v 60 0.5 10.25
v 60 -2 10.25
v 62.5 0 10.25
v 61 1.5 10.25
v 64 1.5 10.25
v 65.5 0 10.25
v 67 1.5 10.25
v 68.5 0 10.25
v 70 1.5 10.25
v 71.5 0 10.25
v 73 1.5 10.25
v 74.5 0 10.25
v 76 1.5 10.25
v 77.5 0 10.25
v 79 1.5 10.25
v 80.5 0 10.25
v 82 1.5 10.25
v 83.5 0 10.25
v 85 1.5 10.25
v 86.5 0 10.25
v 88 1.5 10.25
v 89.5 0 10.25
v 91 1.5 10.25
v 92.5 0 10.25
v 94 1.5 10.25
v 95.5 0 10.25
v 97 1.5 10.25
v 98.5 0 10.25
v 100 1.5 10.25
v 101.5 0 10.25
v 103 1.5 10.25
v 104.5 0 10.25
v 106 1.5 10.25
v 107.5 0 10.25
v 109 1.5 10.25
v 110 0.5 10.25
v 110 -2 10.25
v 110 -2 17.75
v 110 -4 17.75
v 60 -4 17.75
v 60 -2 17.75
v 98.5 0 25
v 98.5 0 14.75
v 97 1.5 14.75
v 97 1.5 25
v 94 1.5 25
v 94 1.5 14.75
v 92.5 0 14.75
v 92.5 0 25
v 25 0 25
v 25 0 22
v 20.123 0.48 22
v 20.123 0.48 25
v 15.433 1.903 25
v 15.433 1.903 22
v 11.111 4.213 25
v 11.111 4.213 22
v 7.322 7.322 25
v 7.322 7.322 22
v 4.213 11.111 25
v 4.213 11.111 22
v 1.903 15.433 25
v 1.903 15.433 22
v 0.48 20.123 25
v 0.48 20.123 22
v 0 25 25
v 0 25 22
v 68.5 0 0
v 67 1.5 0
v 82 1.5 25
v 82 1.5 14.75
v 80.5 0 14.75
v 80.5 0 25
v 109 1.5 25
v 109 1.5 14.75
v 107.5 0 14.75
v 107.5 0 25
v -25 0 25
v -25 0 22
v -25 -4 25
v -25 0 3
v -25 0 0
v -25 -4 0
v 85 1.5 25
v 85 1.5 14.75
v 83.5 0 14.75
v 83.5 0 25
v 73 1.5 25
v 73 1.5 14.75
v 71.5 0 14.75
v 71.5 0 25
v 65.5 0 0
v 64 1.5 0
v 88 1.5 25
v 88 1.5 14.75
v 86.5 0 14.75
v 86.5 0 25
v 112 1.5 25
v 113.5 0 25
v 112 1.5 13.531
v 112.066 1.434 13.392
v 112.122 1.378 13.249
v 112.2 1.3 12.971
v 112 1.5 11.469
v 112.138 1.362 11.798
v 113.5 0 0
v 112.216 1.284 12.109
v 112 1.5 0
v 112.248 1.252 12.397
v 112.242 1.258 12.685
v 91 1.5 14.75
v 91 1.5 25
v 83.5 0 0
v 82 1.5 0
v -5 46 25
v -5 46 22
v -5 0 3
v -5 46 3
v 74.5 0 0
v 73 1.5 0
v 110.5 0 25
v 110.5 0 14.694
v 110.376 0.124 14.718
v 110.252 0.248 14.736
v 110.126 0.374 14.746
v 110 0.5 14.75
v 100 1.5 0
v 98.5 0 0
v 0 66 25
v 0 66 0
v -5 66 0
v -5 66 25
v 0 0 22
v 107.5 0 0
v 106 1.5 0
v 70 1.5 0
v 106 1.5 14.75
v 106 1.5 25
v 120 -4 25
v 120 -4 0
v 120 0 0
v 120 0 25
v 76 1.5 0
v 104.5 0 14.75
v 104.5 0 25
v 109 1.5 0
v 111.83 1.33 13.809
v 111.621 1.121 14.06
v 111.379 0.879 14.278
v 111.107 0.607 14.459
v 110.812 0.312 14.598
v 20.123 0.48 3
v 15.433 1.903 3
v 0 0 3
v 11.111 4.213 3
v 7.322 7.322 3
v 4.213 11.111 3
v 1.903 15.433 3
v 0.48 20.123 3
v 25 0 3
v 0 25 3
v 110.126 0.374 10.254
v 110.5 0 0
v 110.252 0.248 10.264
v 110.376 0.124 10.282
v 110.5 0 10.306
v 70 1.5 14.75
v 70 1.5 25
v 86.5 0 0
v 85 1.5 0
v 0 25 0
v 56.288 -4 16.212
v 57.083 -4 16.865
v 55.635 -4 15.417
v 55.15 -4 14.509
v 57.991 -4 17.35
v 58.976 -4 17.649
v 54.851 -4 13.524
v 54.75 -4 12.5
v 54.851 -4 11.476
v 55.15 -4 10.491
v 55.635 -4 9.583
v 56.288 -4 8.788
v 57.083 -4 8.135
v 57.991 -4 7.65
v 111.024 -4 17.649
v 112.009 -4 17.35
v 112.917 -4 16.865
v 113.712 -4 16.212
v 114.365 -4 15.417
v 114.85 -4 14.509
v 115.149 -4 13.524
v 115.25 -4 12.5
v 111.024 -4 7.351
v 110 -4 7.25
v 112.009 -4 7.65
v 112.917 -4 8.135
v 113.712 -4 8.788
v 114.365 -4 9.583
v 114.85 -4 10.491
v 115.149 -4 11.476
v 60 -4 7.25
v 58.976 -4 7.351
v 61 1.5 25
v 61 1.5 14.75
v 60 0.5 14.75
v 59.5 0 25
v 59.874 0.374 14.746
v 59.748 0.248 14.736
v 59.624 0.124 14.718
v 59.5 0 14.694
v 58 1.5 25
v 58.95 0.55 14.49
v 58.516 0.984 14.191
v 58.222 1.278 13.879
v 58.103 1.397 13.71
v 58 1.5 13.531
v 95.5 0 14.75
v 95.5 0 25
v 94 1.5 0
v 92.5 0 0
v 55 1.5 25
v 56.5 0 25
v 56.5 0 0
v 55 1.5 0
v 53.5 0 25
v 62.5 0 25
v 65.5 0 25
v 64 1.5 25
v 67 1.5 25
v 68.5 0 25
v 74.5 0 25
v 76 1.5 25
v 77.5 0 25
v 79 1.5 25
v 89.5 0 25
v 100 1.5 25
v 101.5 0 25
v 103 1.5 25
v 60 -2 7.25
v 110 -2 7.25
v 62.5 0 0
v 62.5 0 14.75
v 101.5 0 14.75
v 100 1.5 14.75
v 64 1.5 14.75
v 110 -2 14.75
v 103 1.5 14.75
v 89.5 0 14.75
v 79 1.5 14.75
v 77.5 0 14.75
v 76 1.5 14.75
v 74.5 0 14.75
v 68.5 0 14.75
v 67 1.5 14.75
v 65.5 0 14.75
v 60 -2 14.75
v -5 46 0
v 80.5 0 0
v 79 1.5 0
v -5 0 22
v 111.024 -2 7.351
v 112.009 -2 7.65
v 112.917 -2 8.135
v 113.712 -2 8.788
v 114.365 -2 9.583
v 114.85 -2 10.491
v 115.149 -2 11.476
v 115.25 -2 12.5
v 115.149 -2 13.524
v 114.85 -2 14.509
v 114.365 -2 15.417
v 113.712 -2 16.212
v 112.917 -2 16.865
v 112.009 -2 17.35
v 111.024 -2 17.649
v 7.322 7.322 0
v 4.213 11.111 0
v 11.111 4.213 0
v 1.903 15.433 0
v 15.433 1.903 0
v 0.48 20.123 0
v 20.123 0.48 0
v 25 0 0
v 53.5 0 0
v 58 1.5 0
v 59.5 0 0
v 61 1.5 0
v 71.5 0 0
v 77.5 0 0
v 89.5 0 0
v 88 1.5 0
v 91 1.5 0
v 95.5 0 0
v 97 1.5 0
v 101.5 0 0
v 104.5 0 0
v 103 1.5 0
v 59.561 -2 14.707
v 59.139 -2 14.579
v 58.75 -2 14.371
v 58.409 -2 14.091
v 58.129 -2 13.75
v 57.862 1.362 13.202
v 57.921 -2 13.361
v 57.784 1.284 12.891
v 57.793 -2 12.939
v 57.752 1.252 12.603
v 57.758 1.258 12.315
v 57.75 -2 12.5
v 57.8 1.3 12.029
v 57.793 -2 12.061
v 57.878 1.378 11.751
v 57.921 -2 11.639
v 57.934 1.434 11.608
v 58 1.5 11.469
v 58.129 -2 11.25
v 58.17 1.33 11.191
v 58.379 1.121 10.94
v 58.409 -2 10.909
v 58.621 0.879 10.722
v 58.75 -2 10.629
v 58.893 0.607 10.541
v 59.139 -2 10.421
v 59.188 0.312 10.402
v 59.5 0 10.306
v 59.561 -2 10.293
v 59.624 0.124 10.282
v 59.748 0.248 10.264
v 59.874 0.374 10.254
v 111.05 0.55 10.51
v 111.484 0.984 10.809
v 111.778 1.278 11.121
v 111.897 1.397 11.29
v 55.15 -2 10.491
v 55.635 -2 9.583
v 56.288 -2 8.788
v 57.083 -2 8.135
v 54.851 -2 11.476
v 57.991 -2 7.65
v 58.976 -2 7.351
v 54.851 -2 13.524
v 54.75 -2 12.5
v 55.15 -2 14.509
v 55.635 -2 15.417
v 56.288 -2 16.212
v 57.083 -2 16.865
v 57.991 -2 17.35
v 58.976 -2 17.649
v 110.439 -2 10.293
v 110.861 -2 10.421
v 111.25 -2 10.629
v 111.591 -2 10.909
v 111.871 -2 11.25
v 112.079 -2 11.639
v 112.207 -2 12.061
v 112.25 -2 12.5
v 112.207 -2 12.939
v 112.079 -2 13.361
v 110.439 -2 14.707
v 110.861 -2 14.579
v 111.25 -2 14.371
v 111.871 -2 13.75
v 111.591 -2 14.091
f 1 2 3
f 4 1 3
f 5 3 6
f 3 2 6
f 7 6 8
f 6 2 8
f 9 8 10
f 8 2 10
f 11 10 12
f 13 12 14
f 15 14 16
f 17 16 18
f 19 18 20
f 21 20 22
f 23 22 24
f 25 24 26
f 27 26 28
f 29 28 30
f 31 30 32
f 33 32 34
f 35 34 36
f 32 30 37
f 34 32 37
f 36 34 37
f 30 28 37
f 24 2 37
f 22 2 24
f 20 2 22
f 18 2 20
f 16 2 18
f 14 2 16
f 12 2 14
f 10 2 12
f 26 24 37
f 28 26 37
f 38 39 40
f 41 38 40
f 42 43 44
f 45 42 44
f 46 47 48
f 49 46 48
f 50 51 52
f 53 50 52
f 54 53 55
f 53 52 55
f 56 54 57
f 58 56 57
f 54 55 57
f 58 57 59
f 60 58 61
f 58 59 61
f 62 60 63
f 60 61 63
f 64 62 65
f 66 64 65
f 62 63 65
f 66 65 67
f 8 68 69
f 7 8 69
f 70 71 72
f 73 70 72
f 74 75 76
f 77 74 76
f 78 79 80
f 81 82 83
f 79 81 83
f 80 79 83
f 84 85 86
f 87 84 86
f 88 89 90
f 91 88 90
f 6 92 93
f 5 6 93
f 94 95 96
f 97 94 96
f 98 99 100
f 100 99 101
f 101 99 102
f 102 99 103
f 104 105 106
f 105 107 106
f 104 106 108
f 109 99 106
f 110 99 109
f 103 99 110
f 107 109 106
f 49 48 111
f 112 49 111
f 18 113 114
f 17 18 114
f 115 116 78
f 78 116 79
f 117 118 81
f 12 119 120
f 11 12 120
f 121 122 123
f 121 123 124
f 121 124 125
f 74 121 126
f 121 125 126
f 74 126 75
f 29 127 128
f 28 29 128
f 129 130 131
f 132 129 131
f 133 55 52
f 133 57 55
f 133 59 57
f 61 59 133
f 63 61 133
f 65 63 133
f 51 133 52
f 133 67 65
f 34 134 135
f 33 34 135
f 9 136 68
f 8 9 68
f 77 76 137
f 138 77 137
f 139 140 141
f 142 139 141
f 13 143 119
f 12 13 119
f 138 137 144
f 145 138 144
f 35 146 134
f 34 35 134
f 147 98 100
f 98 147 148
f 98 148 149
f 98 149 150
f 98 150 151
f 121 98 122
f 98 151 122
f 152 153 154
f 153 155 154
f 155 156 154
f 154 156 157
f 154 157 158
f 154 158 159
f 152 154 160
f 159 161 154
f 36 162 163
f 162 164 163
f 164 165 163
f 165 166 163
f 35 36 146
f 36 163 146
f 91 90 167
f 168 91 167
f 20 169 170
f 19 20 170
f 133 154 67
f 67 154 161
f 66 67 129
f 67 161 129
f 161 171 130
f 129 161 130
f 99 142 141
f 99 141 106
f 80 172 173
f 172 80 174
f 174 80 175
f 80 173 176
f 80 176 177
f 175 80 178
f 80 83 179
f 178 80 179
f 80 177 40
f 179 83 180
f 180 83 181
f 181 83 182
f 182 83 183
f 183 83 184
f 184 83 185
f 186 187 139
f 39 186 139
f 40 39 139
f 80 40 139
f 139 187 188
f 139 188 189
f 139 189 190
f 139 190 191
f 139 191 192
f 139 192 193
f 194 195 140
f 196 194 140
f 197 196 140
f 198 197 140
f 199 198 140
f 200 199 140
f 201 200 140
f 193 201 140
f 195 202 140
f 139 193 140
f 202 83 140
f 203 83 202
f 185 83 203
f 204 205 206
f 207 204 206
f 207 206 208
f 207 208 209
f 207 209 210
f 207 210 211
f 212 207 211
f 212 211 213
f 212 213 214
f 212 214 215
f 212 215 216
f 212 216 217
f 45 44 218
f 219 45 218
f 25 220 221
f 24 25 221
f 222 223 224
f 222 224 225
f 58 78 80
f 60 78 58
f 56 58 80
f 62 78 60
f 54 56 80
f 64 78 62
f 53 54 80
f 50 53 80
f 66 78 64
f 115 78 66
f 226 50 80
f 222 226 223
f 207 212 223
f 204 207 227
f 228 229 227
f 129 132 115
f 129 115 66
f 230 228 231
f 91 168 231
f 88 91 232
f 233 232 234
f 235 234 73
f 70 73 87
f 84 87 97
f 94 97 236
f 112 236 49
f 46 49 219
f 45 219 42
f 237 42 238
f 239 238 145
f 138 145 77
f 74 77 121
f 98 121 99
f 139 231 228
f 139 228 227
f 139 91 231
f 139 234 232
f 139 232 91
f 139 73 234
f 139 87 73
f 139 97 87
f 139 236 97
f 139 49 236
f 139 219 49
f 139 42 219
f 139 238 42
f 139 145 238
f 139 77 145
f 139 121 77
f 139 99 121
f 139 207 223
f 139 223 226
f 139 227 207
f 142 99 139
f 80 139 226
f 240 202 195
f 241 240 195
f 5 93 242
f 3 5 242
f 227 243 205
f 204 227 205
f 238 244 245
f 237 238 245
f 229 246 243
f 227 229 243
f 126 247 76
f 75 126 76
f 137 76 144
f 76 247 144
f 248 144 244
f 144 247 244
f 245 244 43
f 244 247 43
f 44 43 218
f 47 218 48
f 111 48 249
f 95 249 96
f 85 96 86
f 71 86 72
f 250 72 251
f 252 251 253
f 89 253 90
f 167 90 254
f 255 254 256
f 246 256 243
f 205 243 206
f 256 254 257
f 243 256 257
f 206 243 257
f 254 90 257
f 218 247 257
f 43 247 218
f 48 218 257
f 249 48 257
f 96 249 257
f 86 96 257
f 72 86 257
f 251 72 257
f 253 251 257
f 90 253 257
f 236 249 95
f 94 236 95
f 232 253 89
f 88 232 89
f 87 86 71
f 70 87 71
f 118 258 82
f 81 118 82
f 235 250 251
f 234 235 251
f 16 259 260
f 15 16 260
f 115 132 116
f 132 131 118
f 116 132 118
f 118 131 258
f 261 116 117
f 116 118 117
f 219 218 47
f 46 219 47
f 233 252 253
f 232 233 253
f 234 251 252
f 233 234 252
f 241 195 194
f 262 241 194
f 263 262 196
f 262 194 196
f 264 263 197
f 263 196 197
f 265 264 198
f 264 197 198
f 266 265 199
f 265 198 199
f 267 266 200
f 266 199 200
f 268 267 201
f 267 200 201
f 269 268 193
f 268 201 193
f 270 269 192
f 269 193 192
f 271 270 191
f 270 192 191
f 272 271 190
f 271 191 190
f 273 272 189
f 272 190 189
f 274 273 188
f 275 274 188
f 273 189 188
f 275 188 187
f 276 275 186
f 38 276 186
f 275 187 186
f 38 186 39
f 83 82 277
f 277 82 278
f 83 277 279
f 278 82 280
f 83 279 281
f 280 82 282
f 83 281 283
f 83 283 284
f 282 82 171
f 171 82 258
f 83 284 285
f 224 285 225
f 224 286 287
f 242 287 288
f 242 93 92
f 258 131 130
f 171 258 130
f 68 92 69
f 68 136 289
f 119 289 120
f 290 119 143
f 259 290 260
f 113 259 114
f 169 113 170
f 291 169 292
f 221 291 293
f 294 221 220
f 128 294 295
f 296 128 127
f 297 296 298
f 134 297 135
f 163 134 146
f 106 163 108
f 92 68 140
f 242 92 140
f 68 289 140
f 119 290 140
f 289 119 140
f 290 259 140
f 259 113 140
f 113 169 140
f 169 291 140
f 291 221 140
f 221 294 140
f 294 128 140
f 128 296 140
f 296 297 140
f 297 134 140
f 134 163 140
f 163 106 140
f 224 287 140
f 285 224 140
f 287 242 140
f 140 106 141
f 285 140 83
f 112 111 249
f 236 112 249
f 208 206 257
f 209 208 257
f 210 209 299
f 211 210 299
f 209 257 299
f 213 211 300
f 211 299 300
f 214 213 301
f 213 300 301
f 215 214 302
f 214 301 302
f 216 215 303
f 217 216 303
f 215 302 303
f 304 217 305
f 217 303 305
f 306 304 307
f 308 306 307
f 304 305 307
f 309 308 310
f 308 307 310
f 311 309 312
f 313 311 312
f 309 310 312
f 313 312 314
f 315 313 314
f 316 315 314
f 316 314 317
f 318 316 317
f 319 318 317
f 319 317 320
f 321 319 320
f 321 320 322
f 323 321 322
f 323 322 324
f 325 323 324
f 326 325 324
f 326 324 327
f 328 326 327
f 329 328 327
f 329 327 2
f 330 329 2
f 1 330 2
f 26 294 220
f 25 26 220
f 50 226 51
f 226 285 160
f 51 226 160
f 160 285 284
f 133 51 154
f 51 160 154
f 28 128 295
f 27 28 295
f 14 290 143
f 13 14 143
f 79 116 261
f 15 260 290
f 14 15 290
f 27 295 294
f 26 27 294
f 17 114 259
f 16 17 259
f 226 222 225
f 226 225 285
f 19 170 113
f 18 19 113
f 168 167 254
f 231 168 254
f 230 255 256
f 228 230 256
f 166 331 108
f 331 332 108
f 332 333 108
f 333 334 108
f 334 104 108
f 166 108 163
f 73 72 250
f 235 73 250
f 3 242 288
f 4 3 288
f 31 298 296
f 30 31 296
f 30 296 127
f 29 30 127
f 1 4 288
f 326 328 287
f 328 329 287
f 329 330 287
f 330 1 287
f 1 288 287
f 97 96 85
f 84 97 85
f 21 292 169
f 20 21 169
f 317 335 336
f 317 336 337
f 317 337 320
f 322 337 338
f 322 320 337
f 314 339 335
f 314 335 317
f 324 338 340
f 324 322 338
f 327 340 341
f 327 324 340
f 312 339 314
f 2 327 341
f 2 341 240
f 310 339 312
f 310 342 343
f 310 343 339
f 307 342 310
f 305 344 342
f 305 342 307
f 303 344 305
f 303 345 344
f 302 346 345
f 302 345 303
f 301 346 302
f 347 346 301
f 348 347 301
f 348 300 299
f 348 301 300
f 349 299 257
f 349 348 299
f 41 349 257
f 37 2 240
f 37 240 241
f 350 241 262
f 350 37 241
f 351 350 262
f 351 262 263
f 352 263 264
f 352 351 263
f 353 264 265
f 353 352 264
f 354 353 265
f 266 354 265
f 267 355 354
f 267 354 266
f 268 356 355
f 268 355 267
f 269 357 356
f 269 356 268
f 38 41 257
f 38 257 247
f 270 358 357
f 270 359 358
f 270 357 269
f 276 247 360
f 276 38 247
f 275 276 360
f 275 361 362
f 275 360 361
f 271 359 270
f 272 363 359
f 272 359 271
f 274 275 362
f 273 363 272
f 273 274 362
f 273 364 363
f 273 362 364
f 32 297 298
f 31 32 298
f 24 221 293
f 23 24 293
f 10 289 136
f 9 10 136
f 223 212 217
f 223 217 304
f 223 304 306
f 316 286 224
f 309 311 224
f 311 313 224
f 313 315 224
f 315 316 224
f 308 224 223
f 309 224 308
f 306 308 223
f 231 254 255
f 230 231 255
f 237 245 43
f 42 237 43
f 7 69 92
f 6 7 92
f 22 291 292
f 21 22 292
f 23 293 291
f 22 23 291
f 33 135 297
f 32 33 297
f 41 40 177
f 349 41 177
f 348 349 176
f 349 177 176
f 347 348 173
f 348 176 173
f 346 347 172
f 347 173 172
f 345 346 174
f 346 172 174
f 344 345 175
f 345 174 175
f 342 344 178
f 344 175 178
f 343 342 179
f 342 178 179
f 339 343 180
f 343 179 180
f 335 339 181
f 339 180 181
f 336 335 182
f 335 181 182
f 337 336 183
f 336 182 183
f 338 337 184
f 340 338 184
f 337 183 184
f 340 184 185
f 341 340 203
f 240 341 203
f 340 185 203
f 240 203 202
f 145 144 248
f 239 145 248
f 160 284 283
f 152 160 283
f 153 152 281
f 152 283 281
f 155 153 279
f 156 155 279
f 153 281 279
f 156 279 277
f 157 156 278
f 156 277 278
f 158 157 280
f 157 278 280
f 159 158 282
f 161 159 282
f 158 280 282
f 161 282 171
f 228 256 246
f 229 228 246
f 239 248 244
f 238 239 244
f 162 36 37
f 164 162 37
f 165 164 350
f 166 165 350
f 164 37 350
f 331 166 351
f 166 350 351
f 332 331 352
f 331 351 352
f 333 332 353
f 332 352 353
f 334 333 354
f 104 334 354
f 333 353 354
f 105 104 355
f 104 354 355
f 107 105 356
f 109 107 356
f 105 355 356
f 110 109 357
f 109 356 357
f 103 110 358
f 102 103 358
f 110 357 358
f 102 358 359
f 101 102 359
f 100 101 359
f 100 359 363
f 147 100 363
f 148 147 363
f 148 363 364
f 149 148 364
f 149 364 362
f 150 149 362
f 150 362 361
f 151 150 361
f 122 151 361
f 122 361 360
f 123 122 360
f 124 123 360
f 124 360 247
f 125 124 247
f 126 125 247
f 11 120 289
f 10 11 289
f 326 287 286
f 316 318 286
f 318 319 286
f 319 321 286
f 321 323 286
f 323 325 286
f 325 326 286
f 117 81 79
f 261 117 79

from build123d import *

# Parameters (mm, degrees)
F1_DEPTH = 25
F3_DEPTH = 70.001
F5_DEPTH = 2
F6_W     = 46
F6_H     = 19
F7_DEPTH = 20
F8_W     = 25
F8_H     = 19
F9_DEPTH = 66


with BuildPart() as f1:
    # F0 (on Top) → F1 (new body)
    with BuildSketch(Plane.XY):
        with BuildLine():
            Line((53.5, 0), (25, 0))
            ThreePointArc((25, 0), (7.32233, 7.32233), (0, 25))
            Line((0, 25), (0, 66))
            Line((0, 66), (-5, 66))
            Line((-5, 66), (-5, 46))
            Line((-5, 46), (-25, 0))
            Line((-25, 0), (-25, -4))
            Line((-25, -4), (120, -4))
            Line((120, -4), (120, 0))
            Line((120, 0), (113.5, 0))
            Line((113.5, 0), (112, 1.5))
            Line((112, 1.5), (110.5, 0))
            Line((110.5, 0), (109, 1.5))
            Line((109, 1.5), (107.5, 0))
            Line((107.5, 0), (106, 1.5))
            Line((106, 1.5), (104.5, 0))
            Line((104.5, 0), (103, 1.5))
            Line((103, 1.5), (101.5, 0))
            Line((101.5, 0), (100, 1.5))
            Line((100, 1.5), (98.5, 0))
            Line((98.5, 0), (97, 1.5))
            Line((97, 1.5), (95.5, 0))
            Line((95.5, 0), (94, 1.5))
            Line((94, 1.5), (92.5, 0))
            Line((92.5, 0), (91, 1.5))
            Line((91, 1.5), (89.5, 0))
            Line((89.5, 0), (88, 1.5))
            Line((88, 1.5), (86.5, 0))
            Line((86.5, 0), (85, 1.5))
            Line((85, 1.5), (83.5, 0))
            Line((83.5, 0), (82, 1.5))
            Line((82, 1.5), (80.5, 0))
            Line((80.5, 0), (79, 1.5))
            Line((79, 1.5), (77.5, 0))
            Line((77.5, 0), (76, 1.5))
            Line((76, 1.5), (74.5, 0))
            Line((74.5, 0), (73, 1.5))
            Line((73, 1.5), (71.5, 0))
            Line((71.5, 0), (70, 1.5))
            Line((70, 1.5), (68.5, 0))
            Line((68.5, 0), (67, 1.5))
            Line((67, 1.5), (65.5, 0))
            Line((65.5, 0), (64, 1.5))
            Line((64, 1.5), (62.5, 0))
            Line((62.5, 0), (61, 1.5))
            Line((61, 1.5), (59.5, 0))
            Line((59.5, 0), (58, 1.5))
            Line((58, 1.5), (56.5, 0))
            Line((56.5, 0), (55, 1.5))
            Line((55, 1.5), (53.5, 0))
        make_face()
    extrude(amount=F1_DEPTH)

    # F2 (on face) → F3 (cut, through all)
    with BuildSketch(Plane.XZ.offset(4)):
        with BuildLine():
            Line((60, 10.25), (110, 10.25))
            ThreePointArc((110, 10.25), (112.25, 12.5), (110, 14.75))
            Line((110, 14.75), (60, 14.75))
            ThreePointArc((60, 14.75), (57.75, 12.5), (60, 10.25))
        make_face()
    extrude(amount=-F3_DEPTH, mode=Mode.SUBTRACT)

    # F4 (on face) → F5 (cut)
    with BuildSketch(Plane.XZ.offset(4)):
        with BuildLine():
            Line((110, 17.75), (60, 17.75))
            ThreePointArc((60, 17.75), (54.75, 12.5), (60, 7.25))
            Line((60, 7.25), (110, 7.25))
            ThreePointArc((110, 7.25), (115.25, 12.5), (110, 17.75))
        make_face()
    extrude(amount=-F5_DEPTH, mode=Mode.SUBTRACT)

    # F6 (on face) → F7 (cut, through all)
    with BuildSketch(Plane(origin=(-25, 0, 0), x_dir=(0, -1, 0), z_dir=(-1, 0, 0))):
        with Locations((-23, 12.5)):
            Rectangle(F6_W, F6_H)
    extrude(amount=-F7_DEPTH, mode=Mode.SUBTRACT)

    # F8 (on face) → F9 (cut, through all)
    with BuildSketch(Plane(origin=(0, 66, 0), x_dir=(-1, 0, 0), z_dir=(0, 1, 0))):
        with Locations((-12.5, 12.5)):
            Rectangle(F8_W, F8_H)
    extrude(amount=-F9_DEPTH, mode=Mode.SUBTRACT)


solid = f1.part
